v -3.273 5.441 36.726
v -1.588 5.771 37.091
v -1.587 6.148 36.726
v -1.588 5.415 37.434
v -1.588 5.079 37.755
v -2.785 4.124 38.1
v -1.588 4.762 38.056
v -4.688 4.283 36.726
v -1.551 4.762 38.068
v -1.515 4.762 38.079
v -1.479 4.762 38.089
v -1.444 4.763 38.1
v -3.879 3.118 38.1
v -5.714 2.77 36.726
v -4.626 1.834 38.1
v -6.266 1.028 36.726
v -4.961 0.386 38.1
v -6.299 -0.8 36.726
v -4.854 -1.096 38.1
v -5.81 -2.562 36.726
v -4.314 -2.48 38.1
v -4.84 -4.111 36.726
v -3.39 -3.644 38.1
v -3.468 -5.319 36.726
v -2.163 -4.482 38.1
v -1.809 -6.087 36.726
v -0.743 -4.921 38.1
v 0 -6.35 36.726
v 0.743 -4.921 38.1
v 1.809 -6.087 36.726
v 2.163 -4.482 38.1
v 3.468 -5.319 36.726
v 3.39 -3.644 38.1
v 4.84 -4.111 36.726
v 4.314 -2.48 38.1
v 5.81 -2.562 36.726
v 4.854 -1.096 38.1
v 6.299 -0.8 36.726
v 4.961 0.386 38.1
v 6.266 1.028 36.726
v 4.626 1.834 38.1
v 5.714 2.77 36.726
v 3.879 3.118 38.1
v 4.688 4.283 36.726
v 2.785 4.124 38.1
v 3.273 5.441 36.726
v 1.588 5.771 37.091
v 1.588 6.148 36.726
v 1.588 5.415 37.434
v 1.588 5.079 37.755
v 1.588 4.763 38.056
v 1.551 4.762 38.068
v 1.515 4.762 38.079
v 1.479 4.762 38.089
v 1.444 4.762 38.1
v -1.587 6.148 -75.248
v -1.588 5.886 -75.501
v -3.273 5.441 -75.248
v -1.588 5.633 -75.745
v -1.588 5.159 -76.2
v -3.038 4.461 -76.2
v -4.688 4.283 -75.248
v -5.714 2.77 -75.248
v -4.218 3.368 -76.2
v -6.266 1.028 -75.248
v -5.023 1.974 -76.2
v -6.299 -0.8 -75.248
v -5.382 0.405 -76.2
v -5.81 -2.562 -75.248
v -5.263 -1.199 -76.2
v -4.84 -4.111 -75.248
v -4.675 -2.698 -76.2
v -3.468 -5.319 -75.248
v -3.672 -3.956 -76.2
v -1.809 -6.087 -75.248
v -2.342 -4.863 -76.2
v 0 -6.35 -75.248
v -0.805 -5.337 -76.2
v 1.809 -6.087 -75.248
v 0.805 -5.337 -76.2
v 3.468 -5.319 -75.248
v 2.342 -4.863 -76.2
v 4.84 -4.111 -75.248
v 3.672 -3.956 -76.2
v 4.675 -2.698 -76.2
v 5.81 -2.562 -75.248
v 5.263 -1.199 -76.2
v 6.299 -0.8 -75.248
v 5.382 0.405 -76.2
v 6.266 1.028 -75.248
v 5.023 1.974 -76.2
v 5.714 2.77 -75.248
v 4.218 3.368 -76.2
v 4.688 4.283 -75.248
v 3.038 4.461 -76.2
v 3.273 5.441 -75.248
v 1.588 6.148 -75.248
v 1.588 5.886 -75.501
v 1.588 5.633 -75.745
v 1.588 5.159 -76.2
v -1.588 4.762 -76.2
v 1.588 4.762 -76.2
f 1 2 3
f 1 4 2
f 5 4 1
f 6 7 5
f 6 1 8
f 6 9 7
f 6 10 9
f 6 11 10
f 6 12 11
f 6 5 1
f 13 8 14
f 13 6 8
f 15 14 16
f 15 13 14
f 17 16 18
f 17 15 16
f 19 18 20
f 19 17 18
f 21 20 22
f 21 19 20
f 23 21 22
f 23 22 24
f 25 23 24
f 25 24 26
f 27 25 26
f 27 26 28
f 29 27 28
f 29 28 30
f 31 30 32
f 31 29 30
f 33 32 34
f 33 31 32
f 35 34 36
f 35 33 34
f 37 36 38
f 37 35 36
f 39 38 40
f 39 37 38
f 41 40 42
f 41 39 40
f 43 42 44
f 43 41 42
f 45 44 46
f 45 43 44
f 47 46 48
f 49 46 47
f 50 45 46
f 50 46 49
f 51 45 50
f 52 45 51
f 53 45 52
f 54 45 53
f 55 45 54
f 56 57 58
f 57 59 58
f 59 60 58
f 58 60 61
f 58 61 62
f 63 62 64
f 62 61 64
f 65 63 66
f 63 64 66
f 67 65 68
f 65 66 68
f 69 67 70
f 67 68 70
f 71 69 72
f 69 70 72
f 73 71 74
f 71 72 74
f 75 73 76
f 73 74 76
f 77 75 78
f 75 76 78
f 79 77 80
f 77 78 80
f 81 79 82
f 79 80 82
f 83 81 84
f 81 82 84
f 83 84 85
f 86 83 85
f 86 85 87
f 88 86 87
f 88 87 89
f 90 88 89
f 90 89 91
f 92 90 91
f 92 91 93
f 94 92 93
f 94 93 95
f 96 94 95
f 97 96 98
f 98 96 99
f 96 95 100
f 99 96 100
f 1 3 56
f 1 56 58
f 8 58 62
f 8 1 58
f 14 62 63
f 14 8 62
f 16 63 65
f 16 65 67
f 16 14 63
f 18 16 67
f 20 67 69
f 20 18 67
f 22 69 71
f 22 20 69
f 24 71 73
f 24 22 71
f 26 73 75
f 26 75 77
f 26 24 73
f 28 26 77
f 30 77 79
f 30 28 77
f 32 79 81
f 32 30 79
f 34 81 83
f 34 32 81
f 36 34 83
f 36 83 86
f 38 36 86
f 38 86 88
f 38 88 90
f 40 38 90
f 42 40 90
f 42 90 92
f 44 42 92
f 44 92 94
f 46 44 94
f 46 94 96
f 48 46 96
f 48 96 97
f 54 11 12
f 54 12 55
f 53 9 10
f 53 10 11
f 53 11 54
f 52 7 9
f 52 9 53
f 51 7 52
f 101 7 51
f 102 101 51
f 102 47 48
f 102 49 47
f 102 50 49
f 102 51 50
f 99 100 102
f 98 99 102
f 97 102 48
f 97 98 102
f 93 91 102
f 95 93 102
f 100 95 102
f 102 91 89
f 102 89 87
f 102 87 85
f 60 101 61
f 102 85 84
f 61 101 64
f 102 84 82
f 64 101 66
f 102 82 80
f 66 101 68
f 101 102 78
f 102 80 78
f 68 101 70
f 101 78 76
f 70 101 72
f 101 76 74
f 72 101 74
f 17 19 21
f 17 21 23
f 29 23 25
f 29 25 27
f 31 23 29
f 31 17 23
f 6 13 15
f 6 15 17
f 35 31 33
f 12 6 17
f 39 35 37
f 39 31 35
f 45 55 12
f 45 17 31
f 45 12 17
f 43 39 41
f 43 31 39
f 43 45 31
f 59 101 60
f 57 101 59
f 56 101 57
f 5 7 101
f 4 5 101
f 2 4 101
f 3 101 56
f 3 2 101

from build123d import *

# Parameters (mm, degrees)
SKETCH1_R           = 6.35
EXTRUDE1_DEPTH      = 76.2
CHAMFER1_SIZE       = 0.9525
SKETCH3_W           = 3.175
SKETCH3_H           = 1.5875
EXTRUDE2_DEPTH      = 77.727341932
EXTRUDE2_DEPTH_BACK = 77.727341932
CHAMFER2_SIZE       = 1.373522526


with BuildPart() as part:
    # Sketch1 → Extrude1 (new, symmetric)
    with BuildSketch(Plane.XY):
        with Locations(Location((0, 0, 0), (0, 0, 180))):
            Circle(SKETCH1_R)
    extrude(amount=EXTRUDE1_DEPTH, both=True)

    # Chamfer1
    chamfer1_edges = [part.edges().sort_by_distance(p)[0] for p in [
        (6.35, 0, -76.2),
        (6.35, 0, 76.2),
    ]]
    chamfer(chamfer1_edges, length=CHAMFER1_SIZE)

    # Sketch3 → Extrude2 (cut, two sides)
    with BuildSketch(Plane.XY) as extrude2_sk:
        with Locations((0, 5.55625)):
            Rectangle(SKETCH3_W, SKETCH3_H)
    extrude(amount=EXTRUDE2_DEPTH, mode=Mode.SUBTRACT)
    extrude(extrude2_sk.sketch, amount=-EXTRUDE2_DEPTH_BACK, mode=Mode.SUBTRACT)

    # SurfaceCut1
    split(bisect_by=Plane.XY.offset(38.1), keep=Keep.BOTTOM)

    # Chamfer2
    chamfer2_edges = [part.edges().sort_by_distance(p)[0] for p in [
        (0, -6.35, 38.1),
    ]]
    chamfer(chamfer2_edges, length=CHAMFER2_SIZE)


solid = part.part
